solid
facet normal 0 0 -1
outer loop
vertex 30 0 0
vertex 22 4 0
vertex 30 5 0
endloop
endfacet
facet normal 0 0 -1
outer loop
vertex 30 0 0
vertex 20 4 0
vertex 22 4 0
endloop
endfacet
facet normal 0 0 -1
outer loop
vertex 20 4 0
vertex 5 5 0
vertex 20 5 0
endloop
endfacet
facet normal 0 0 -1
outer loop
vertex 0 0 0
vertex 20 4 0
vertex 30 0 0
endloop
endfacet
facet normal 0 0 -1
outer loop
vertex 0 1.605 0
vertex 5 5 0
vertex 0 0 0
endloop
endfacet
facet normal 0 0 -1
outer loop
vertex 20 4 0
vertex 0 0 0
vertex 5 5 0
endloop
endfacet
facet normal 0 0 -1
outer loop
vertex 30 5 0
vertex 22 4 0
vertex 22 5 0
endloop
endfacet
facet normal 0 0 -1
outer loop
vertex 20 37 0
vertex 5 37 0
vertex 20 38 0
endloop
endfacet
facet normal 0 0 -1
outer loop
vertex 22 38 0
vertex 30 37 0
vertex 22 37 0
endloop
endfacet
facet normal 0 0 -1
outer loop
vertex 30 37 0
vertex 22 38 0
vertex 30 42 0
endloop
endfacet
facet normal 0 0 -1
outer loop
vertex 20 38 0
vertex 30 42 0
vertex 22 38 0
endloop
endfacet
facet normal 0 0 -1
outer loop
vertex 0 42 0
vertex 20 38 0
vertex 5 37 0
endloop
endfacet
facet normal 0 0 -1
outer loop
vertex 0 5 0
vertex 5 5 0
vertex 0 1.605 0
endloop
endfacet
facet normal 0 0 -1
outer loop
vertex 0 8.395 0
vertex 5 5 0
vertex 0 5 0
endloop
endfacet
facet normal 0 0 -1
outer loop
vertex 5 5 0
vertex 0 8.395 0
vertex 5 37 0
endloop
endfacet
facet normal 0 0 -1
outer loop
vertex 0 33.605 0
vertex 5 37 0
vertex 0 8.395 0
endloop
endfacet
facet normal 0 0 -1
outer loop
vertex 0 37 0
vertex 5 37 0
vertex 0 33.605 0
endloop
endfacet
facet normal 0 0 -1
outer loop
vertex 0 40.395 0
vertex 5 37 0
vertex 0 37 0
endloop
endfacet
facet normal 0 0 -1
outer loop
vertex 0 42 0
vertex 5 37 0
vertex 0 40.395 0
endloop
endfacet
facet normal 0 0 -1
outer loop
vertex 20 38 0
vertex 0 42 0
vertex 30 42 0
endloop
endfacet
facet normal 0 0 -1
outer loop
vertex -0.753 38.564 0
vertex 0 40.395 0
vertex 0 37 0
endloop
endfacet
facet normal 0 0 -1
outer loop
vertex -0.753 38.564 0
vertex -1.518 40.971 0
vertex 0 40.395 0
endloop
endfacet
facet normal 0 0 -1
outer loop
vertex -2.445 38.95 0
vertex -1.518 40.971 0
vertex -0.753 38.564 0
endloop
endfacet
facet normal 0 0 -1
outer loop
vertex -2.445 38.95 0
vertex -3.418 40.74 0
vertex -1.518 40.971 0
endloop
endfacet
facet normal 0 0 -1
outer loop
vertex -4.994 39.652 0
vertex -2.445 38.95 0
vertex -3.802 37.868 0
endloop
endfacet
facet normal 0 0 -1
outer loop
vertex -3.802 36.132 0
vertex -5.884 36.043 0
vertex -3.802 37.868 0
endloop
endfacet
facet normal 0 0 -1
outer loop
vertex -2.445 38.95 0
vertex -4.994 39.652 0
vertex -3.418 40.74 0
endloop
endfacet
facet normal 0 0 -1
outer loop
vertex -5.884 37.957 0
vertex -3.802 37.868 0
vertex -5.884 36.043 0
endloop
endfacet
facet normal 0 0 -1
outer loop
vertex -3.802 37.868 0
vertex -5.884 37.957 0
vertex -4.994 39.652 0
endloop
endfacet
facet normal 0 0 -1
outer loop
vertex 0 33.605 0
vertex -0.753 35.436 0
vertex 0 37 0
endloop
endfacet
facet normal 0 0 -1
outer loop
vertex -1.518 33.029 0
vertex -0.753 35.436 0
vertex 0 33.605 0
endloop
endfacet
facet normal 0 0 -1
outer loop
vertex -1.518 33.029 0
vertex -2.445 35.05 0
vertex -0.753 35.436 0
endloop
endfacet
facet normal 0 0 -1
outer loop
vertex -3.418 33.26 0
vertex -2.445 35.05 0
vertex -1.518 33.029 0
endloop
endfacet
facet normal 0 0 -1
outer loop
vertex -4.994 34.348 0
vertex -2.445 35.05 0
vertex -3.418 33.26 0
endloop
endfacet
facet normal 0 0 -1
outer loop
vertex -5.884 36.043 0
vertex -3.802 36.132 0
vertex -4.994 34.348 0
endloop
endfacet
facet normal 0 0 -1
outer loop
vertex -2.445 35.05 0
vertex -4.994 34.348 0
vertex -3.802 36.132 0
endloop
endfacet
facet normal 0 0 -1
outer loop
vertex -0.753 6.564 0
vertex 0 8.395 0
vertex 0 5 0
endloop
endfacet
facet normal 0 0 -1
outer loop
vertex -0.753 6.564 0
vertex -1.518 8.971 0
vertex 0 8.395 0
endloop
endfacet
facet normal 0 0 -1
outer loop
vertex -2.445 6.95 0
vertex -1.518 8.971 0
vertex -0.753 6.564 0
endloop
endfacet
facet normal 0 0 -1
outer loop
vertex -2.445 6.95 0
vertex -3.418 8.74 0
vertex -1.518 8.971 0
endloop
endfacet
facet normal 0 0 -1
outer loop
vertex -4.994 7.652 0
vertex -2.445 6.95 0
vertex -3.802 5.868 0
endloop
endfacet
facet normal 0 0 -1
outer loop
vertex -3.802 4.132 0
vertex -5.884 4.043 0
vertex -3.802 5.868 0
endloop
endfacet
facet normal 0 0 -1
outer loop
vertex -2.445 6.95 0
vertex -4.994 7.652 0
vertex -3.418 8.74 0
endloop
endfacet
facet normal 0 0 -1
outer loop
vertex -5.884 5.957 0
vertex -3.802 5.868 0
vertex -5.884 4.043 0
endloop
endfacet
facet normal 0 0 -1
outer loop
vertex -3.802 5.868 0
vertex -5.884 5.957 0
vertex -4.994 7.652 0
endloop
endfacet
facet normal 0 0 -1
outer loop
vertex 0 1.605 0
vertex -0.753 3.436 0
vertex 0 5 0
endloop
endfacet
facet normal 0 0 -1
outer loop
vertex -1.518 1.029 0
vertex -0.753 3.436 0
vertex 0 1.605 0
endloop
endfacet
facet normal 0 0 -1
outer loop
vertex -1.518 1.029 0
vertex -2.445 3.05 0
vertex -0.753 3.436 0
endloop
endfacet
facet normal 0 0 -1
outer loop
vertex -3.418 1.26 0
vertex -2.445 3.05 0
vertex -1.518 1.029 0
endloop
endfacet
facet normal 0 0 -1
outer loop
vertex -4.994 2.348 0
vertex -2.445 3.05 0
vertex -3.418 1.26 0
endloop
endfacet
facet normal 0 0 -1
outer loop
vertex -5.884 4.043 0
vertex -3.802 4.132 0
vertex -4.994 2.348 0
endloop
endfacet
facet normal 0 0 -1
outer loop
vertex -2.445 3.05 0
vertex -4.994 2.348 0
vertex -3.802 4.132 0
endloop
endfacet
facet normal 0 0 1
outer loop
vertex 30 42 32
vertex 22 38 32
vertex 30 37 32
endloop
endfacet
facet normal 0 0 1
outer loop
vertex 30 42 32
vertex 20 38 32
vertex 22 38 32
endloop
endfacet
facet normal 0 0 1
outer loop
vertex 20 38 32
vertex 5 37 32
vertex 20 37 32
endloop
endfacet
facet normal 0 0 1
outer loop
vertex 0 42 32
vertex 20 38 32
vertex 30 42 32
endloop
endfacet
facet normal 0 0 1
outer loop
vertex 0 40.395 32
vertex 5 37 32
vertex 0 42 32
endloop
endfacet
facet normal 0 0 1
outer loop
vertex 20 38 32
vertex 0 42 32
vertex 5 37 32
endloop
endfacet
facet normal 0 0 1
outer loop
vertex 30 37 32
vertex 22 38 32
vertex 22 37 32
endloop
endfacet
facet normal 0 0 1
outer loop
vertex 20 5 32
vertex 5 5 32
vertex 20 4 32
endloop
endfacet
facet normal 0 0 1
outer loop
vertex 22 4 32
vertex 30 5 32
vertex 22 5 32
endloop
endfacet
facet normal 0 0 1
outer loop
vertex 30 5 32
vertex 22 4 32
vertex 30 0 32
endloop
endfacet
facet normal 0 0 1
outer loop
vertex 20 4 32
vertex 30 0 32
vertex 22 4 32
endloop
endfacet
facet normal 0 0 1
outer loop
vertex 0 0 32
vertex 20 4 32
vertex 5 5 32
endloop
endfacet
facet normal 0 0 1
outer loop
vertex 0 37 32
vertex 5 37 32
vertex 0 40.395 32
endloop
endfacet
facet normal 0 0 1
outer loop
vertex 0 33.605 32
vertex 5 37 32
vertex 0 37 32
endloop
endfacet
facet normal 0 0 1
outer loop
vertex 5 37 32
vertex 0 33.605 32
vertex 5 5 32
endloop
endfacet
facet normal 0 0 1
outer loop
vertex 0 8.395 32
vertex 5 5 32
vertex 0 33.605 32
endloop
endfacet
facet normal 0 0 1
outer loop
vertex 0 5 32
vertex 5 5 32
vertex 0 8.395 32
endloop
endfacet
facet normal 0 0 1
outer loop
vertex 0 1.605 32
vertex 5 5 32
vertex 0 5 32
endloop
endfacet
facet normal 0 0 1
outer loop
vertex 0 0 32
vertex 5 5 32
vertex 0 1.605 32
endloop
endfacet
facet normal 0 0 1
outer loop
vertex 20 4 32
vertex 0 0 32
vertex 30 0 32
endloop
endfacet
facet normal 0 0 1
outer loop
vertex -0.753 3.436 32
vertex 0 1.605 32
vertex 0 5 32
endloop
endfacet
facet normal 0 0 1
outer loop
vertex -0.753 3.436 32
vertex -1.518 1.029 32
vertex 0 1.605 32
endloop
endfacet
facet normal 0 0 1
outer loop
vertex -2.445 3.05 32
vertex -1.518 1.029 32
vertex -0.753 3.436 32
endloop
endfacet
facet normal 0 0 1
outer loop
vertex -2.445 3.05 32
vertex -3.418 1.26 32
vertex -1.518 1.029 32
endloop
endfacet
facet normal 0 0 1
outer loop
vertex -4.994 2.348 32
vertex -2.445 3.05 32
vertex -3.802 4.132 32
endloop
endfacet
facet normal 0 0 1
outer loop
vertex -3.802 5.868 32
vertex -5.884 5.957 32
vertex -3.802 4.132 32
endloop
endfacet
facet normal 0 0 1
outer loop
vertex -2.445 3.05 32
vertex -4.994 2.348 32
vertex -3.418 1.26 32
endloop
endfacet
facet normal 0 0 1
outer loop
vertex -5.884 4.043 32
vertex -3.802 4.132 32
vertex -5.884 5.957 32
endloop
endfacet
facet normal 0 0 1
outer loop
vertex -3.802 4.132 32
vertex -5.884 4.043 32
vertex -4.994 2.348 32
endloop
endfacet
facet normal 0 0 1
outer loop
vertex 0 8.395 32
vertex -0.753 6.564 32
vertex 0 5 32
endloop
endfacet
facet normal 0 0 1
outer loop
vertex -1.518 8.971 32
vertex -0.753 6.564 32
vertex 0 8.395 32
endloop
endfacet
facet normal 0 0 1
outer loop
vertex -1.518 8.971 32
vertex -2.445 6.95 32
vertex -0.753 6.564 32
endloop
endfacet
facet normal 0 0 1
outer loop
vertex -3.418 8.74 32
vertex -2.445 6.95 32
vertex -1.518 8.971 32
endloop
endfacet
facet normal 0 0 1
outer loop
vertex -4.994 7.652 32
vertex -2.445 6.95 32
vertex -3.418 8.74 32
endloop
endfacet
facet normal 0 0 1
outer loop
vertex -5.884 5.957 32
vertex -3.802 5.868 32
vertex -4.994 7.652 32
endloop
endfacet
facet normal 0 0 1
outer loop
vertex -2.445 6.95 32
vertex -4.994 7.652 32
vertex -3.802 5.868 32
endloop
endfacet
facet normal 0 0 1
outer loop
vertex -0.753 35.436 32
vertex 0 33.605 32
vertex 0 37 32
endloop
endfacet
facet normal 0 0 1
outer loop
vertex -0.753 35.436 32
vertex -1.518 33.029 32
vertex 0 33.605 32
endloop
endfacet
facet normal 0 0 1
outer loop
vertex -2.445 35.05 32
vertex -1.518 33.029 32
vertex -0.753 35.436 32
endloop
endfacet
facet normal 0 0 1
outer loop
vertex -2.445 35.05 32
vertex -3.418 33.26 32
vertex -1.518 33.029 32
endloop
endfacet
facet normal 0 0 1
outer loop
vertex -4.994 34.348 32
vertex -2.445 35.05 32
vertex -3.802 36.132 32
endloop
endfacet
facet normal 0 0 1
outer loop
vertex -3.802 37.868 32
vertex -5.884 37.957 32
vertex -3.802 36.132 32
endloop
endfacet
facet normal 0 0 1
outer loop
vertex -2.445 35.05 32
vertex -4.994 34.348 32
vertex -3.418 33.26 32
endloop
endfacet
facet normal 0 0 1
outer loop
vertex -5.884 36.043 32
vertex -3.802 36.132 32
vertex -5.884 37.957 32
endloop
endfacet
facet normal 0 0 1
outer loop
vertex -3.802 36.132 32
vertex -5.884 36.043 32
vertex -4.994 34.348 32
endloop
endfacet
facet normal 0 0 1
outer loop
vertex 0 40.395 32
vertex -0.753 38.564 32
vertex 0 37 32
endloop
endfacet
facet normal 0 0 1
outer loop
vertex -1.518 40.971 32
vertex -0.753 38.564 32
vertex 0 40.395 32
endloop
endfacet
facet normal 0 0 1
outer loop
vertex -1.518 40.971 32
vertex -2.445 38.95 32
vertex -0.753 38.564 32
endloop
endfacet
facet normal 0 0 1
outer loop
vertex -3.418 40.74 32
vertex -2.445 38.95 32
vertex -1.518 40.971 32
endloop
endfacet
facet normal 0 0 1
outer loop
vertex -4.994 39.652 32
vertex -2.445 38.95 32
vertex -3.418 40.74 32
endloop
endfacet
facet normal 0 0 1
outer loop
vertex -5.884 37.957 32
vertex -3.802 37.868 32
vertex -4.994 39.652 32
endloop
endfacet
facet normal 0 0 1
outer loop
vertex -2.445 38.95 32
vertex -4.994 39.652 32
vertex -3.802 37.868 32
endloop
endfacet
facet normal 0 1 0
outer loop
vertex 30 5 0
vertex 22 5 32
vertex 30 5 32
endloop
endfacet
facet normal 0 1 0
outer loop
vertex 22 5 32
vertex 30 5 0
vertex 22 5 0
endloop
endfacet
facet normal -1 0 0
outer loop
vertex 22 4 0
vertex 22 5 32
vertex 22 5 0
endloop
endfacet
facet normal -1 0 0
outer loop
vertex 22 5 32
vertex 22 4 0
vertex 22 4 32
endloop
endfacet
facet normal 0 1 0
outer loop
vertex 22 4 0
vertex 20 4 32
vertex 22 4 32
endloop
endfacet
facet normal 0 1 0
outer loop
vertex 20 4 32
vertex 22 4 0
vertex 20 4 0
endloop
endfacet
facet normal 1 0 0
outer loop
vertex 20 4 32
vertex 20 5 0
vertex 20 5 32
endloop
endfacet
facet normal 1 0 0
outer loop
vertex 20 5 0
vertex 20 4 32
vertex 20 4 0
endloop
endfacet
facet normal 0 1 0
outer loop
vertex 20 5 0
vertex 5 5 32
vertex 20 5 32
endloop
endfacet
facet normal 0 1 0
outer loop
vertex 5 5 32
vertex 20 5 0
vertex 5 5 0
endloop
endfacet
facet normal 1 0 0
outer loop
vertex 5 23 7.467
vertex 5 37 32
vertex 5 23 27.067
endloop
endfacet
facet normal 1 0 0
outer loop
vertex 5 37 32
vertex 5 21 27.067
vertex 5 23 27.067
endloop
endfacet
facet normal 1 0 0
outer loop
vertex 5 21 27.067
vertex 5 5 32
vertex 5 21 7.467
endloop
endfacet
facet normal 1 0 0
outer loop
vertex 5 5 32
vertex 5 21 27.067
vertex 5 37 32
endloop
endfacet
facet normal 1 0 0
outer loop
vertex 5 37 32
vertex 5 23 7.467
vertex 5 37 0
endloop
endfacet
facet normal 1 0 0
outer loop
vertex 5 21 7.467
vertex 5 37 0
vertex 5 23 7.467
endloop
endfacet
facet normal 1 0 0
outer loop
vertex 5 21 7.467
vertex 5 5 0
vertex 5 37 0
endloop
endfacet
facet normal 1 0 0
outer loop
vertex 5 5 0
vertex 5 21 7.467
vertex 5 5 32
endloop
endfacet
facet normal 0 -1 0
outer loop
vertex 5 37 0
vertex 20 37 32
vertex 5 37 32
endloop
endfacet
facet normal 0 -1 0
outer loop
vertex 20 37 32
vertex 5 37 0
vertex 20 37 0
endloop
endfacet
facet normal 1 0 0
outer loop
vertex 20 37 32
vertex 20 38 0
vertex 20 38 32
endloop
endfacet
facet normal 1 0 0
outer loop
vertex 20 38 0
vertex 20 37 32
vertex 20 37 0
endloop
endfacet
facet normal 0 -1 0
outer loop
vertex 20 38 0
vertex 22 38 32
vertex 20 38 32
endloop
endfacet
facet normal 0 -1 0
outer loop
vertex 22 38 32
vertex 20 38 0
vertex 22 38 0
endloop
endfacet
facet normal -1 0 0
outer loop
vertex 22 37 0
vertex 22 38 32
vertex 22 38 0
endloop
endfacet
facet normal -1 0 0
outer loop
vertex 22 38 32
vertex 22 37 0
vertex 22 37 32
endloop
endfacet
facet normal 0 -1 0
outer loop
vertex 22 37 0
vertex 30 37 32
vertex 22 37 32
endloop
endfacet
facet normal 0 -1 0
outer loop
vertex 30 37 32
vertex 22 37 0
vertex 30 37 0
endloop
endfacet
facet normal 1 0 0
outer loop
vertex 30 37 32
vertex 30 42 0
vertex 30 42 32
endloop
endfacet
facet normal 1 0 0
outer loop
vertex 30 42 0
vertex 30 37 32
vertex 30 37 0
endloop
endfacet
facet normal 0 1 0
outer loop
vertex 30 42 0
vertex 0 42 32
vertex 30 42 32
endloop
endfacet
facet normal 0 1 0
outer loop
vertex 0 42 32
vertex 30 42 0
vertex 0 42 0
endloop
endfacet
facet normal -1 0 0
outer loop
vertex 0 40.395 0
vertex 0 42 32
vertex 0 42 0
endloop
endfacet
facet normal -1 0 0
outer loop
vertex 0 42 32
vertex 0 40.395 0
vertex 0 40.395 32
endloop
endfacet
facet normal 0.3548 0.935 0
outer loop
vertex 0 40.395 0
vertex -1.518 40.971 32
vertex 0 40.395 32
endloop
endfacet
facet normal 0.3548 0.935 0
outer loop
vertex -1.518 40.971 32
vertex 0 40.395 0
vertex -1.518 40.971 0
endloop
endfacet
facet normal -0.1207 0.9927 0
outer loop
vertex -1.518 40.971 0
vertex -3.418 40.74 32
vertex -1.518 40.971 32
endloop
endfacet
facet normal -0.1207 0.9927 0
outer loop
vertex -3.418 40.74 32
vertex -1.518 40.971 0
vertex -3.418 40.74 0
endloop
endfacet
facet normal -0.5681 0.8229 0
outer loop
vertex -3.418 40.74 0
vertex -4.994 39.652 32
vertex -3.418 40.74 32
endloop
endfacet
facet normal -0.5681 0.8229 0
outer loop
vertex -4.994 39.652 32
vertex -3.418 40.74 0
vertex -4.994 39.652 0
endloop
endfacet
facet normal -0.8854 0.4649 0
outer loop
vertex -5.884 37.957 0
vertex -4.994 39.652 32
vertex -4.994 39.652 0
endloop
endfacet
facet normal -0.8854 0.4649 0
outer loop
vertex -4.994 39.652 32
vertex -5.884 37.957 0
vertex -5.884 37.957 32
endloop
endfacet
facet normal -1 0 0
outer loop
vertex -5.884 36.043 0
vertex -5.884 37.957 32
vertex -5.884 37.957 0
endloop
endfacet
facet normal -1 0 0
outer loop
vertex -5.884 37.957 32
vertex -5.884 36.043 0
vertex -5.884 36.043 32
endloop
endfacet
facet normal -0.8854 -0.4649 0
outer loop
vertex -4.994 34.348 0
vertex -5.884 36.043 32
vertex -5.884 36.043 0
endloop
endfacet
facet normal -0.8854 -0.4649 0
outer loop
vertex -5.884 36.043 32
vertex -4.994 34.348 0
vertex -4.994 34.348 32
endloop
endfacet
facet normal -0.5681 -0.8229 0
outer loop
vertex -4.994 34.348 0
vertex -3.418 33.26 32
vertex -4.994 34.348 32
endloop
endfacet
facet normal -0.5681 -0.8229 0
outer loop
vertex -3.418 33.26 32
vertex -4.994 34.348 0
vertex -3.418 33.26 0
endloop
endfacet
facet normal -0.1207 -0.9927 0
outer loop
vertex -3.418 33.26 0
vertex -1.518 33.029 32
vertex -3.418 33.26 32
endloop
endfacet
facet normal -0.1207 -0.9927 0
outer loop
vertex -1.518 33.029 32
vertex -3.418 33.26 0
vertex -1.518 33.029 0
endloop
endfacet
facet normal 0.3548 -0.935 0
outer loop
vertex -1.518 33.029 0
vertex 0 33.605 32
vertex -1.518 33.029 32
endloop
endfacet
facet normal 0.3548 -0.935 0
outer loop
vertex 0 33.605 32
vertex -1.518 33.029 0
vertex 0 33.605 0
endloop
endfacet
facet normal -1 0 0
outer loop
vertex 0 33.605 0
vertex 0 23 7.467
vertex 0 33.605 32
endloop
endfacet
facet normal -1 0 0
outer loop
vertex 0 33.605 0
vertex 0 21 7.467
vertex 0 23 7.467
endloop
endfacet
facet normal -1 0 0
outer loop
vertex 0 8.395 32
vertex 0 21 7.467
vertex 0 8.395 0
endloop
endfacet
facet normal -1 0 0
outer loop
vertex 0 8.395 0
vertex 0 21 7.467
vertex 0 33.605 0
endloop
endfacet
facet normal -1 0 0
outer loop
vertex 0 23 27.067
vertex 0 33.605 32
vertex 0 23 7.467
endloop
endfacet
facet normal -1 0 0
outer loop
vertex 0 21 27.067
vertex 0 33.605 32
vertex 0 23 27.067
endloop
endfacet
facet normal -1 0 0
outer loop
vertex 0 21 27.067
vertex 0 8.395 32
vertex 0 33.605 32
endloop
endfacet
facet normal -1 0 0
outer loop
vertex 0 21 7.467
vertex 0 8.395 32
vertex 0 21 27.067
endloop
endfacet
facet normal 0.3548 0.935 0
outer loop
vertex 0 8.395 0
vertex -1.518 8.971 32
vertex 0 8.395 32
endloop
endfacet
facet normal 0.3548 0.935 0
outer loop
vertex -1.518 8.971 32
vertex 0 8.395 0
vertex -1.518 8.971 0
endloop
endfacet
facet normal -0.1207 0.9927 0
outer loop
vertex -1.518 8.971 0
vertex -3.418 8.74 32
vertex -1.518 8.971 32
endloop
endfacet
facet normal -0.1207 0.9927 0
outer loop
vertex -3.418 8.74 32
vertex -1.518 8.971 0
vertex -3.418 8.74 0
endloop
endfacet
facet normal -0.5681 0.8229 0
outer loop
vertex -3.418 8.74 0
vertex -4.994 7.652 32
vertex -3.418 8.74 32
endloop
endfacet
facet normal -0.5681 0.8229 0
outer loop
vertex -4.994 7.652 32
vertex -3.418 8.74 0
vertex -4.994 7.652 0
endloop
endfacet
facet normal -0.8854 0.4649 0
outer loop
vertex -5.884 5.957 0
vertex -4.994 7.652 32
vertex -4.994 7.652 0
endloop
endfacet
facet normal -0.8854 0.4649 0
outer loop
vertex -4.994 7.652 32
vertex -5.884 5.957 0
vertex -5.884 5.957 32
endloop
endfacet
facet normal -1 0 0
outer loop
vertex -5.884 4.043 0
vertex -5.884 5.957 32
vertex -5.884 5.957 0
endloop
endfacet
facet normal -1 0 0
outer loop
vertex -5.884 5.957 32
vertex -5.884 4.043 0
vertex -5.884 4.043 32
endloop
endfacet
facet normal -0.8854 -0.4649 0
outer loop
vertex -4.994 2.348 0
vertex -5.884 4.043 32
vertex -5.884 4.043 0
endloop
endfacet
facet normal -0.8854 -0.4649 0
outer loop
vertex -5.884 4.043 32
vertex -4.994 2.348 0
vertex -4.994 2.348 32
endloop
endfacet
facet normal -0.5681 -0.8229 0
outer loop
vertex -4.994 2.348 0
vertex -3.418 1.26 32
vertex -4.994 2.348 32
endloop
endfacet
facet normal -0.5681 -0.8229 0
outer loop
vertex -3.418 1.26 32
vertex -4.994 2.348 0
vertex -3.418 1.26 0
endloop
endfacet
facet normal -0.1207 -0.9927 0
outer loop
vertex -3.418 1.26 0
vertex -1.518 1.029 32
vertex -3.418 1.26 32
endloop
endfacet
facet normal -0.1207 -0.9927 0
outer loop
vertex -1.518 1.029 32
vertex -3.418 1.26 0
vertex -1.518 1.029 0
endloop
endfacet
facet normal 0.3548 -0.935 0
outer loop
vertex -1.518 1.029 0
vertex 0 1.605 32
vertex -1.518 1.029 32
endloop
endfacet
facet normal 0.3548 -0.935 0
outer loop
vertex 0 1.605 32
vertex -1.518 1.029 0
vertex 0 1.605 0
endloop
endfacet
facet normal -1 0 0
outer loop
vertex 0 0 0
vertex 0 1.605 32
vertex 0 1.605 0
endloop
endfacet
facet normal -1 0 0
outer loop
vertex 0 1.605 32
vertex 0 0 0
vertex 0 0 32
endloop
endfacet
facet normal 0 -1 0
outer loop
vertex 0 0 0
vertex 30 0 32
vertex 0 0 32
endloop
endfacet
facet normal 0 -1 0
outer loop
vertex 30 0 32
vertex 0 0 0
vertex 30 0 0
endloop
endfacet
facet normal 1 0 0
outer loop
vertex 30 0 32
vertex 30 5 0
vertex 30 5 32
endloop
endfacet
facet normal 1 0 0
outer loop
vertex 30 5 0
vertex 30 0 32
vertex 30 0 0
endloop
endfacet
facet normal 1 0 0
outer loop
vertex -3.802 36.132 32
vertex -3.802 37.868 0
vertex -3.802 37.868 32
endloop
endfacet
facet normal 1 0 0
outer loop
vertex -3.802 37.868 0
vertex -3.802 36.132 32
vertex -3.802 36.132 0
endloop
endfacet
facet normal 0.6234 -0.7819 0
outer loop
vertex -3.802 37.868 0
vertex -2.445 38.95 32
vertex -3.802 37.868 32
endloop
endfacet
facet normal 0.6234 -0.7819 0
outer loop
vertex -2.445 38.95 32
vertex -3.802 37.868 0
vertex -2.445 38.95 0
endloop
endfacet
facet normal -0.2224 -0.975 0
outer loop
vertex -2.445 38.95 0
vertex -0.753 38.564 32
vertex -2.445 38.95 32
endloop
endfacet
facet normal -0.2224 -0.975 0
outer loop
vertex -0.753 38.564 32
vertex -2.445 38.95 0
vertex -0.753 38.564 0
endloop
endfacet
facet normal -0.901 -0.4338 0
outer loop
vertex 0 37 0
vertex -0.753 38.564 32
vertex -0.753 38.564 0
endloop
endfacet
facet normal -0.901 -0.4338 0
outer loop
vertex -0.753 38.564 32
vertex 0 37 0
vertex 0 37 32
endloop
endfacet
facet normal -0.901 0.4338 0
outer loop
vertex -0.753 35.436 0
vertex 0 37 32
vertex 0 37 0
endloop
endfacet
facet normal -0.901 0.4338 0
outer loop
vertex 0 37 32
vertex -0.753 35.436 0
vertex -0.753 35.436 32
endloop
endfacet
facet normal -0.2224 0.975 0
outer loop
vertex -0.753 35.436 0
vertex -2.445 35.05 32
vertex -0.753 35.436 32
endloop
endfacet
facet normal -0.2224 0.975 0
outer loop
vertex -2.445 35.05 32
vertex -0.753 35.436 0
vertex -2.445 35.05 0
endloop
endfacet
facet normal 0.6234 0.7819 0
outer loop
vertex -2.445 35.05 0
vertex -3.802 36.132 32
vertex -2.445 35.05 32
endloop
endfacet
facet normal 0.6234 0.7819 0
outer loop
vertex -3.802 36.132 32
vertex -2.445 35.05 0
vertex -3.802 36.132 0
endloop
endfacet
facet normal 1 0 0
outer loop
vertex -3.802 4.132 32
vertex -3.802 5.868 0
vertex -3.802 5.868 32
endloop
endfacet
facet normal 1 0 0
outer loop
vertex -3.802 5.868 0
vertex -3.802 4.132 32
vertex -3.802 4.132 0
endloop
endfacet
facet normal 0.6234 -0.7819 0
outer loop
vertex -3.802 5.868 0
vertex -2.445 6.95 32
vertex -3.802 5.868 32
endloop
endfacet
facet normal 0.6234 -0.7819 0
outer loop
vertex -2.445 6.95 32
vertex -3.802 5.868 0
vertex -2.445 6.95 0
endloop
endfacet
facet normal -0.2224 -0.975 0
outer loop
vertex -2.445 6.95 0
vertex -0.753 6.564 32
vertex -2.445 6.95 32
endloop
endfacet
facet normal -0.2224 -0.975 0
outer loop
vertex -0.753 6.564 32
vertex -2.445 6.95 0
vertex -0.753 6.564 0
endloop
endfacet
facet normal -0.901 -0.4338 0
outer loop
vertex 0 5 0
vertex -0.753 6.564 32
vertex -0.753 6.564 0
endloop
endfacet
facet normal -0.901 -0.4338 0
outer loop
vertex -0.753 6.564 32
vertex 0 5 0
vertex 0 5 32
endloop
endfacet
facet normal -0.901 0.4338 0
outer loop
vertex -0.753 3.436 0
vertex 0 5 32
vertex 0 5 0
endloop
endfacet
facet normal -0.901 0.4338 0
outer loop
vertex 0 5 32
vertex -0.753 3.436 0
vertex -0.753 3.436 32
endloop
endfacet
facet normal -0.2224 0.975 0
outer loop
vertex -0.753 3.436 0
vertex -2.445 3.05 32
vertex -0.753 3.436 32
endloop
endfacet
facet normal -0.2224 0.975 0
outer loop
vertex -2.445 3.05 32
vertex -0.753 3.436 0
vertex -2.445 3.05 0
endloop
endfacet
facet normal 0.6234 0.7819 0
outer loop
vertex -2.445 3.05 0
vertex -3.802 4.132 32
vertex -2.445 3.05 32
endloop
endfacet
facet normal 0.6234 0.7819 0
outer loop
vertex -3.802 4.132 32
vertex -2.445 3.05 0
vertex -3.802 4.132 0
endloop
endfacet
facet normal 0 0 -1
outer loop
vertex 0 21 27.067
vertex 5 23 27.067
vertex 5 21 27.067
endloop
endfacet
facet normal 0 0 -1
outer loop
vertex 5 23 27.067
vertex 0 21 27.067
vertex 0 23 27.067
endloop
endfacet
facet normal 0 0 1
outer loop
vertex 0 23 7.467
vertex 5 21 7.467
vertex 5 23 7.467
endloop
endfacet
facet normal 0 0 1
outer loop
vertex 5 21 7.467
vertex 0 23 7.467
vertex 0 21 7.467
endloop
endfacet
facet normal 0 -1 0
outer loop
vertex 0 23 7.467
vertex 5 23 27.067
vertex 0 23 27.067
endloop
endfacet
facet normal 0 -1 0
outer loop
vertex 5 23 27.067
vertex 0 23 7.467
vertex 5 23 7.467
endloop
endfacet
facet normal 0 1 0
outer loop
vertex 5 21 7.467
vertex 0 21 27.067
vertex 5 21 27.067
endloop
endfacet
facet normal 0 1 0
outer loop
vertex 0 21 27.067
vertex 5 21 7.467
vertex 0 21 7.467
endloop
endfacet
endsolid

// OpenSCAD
case_thickness = 5;
case_depth = 30;
card_height = 32;
card_breadth = 32;;
card_width = 2;
cable_width = 19.6;
cable_height = 0.5;

total_height = card_height + (2 * case_thickness);
mount_offset = 5;

module basic_case(height)
linear_extrude(height = height) {
     translate([-2,mount_offset]) mount_point();
     translate([-2,total_height - mount_offset]) mount_point();
     difference() {
          square(size=[case_depth, card_height + (case_thickness * 2)]);
          translate([case_thickness,case_thickness])
               square(size=[case_depth,card_height]);
          translate([20,4]) square(size=[card_width, card_height+2]);
     }
}

module mount_point()
     difference() {
     circle(d=8);
     circle(d=4);
     }

difference() {
     basic_case(card_breadth);
     translate([0, total_height/2, (total_height - cable_width)/3])
          cube([case_thickness, 2, cable_width]);
     }
